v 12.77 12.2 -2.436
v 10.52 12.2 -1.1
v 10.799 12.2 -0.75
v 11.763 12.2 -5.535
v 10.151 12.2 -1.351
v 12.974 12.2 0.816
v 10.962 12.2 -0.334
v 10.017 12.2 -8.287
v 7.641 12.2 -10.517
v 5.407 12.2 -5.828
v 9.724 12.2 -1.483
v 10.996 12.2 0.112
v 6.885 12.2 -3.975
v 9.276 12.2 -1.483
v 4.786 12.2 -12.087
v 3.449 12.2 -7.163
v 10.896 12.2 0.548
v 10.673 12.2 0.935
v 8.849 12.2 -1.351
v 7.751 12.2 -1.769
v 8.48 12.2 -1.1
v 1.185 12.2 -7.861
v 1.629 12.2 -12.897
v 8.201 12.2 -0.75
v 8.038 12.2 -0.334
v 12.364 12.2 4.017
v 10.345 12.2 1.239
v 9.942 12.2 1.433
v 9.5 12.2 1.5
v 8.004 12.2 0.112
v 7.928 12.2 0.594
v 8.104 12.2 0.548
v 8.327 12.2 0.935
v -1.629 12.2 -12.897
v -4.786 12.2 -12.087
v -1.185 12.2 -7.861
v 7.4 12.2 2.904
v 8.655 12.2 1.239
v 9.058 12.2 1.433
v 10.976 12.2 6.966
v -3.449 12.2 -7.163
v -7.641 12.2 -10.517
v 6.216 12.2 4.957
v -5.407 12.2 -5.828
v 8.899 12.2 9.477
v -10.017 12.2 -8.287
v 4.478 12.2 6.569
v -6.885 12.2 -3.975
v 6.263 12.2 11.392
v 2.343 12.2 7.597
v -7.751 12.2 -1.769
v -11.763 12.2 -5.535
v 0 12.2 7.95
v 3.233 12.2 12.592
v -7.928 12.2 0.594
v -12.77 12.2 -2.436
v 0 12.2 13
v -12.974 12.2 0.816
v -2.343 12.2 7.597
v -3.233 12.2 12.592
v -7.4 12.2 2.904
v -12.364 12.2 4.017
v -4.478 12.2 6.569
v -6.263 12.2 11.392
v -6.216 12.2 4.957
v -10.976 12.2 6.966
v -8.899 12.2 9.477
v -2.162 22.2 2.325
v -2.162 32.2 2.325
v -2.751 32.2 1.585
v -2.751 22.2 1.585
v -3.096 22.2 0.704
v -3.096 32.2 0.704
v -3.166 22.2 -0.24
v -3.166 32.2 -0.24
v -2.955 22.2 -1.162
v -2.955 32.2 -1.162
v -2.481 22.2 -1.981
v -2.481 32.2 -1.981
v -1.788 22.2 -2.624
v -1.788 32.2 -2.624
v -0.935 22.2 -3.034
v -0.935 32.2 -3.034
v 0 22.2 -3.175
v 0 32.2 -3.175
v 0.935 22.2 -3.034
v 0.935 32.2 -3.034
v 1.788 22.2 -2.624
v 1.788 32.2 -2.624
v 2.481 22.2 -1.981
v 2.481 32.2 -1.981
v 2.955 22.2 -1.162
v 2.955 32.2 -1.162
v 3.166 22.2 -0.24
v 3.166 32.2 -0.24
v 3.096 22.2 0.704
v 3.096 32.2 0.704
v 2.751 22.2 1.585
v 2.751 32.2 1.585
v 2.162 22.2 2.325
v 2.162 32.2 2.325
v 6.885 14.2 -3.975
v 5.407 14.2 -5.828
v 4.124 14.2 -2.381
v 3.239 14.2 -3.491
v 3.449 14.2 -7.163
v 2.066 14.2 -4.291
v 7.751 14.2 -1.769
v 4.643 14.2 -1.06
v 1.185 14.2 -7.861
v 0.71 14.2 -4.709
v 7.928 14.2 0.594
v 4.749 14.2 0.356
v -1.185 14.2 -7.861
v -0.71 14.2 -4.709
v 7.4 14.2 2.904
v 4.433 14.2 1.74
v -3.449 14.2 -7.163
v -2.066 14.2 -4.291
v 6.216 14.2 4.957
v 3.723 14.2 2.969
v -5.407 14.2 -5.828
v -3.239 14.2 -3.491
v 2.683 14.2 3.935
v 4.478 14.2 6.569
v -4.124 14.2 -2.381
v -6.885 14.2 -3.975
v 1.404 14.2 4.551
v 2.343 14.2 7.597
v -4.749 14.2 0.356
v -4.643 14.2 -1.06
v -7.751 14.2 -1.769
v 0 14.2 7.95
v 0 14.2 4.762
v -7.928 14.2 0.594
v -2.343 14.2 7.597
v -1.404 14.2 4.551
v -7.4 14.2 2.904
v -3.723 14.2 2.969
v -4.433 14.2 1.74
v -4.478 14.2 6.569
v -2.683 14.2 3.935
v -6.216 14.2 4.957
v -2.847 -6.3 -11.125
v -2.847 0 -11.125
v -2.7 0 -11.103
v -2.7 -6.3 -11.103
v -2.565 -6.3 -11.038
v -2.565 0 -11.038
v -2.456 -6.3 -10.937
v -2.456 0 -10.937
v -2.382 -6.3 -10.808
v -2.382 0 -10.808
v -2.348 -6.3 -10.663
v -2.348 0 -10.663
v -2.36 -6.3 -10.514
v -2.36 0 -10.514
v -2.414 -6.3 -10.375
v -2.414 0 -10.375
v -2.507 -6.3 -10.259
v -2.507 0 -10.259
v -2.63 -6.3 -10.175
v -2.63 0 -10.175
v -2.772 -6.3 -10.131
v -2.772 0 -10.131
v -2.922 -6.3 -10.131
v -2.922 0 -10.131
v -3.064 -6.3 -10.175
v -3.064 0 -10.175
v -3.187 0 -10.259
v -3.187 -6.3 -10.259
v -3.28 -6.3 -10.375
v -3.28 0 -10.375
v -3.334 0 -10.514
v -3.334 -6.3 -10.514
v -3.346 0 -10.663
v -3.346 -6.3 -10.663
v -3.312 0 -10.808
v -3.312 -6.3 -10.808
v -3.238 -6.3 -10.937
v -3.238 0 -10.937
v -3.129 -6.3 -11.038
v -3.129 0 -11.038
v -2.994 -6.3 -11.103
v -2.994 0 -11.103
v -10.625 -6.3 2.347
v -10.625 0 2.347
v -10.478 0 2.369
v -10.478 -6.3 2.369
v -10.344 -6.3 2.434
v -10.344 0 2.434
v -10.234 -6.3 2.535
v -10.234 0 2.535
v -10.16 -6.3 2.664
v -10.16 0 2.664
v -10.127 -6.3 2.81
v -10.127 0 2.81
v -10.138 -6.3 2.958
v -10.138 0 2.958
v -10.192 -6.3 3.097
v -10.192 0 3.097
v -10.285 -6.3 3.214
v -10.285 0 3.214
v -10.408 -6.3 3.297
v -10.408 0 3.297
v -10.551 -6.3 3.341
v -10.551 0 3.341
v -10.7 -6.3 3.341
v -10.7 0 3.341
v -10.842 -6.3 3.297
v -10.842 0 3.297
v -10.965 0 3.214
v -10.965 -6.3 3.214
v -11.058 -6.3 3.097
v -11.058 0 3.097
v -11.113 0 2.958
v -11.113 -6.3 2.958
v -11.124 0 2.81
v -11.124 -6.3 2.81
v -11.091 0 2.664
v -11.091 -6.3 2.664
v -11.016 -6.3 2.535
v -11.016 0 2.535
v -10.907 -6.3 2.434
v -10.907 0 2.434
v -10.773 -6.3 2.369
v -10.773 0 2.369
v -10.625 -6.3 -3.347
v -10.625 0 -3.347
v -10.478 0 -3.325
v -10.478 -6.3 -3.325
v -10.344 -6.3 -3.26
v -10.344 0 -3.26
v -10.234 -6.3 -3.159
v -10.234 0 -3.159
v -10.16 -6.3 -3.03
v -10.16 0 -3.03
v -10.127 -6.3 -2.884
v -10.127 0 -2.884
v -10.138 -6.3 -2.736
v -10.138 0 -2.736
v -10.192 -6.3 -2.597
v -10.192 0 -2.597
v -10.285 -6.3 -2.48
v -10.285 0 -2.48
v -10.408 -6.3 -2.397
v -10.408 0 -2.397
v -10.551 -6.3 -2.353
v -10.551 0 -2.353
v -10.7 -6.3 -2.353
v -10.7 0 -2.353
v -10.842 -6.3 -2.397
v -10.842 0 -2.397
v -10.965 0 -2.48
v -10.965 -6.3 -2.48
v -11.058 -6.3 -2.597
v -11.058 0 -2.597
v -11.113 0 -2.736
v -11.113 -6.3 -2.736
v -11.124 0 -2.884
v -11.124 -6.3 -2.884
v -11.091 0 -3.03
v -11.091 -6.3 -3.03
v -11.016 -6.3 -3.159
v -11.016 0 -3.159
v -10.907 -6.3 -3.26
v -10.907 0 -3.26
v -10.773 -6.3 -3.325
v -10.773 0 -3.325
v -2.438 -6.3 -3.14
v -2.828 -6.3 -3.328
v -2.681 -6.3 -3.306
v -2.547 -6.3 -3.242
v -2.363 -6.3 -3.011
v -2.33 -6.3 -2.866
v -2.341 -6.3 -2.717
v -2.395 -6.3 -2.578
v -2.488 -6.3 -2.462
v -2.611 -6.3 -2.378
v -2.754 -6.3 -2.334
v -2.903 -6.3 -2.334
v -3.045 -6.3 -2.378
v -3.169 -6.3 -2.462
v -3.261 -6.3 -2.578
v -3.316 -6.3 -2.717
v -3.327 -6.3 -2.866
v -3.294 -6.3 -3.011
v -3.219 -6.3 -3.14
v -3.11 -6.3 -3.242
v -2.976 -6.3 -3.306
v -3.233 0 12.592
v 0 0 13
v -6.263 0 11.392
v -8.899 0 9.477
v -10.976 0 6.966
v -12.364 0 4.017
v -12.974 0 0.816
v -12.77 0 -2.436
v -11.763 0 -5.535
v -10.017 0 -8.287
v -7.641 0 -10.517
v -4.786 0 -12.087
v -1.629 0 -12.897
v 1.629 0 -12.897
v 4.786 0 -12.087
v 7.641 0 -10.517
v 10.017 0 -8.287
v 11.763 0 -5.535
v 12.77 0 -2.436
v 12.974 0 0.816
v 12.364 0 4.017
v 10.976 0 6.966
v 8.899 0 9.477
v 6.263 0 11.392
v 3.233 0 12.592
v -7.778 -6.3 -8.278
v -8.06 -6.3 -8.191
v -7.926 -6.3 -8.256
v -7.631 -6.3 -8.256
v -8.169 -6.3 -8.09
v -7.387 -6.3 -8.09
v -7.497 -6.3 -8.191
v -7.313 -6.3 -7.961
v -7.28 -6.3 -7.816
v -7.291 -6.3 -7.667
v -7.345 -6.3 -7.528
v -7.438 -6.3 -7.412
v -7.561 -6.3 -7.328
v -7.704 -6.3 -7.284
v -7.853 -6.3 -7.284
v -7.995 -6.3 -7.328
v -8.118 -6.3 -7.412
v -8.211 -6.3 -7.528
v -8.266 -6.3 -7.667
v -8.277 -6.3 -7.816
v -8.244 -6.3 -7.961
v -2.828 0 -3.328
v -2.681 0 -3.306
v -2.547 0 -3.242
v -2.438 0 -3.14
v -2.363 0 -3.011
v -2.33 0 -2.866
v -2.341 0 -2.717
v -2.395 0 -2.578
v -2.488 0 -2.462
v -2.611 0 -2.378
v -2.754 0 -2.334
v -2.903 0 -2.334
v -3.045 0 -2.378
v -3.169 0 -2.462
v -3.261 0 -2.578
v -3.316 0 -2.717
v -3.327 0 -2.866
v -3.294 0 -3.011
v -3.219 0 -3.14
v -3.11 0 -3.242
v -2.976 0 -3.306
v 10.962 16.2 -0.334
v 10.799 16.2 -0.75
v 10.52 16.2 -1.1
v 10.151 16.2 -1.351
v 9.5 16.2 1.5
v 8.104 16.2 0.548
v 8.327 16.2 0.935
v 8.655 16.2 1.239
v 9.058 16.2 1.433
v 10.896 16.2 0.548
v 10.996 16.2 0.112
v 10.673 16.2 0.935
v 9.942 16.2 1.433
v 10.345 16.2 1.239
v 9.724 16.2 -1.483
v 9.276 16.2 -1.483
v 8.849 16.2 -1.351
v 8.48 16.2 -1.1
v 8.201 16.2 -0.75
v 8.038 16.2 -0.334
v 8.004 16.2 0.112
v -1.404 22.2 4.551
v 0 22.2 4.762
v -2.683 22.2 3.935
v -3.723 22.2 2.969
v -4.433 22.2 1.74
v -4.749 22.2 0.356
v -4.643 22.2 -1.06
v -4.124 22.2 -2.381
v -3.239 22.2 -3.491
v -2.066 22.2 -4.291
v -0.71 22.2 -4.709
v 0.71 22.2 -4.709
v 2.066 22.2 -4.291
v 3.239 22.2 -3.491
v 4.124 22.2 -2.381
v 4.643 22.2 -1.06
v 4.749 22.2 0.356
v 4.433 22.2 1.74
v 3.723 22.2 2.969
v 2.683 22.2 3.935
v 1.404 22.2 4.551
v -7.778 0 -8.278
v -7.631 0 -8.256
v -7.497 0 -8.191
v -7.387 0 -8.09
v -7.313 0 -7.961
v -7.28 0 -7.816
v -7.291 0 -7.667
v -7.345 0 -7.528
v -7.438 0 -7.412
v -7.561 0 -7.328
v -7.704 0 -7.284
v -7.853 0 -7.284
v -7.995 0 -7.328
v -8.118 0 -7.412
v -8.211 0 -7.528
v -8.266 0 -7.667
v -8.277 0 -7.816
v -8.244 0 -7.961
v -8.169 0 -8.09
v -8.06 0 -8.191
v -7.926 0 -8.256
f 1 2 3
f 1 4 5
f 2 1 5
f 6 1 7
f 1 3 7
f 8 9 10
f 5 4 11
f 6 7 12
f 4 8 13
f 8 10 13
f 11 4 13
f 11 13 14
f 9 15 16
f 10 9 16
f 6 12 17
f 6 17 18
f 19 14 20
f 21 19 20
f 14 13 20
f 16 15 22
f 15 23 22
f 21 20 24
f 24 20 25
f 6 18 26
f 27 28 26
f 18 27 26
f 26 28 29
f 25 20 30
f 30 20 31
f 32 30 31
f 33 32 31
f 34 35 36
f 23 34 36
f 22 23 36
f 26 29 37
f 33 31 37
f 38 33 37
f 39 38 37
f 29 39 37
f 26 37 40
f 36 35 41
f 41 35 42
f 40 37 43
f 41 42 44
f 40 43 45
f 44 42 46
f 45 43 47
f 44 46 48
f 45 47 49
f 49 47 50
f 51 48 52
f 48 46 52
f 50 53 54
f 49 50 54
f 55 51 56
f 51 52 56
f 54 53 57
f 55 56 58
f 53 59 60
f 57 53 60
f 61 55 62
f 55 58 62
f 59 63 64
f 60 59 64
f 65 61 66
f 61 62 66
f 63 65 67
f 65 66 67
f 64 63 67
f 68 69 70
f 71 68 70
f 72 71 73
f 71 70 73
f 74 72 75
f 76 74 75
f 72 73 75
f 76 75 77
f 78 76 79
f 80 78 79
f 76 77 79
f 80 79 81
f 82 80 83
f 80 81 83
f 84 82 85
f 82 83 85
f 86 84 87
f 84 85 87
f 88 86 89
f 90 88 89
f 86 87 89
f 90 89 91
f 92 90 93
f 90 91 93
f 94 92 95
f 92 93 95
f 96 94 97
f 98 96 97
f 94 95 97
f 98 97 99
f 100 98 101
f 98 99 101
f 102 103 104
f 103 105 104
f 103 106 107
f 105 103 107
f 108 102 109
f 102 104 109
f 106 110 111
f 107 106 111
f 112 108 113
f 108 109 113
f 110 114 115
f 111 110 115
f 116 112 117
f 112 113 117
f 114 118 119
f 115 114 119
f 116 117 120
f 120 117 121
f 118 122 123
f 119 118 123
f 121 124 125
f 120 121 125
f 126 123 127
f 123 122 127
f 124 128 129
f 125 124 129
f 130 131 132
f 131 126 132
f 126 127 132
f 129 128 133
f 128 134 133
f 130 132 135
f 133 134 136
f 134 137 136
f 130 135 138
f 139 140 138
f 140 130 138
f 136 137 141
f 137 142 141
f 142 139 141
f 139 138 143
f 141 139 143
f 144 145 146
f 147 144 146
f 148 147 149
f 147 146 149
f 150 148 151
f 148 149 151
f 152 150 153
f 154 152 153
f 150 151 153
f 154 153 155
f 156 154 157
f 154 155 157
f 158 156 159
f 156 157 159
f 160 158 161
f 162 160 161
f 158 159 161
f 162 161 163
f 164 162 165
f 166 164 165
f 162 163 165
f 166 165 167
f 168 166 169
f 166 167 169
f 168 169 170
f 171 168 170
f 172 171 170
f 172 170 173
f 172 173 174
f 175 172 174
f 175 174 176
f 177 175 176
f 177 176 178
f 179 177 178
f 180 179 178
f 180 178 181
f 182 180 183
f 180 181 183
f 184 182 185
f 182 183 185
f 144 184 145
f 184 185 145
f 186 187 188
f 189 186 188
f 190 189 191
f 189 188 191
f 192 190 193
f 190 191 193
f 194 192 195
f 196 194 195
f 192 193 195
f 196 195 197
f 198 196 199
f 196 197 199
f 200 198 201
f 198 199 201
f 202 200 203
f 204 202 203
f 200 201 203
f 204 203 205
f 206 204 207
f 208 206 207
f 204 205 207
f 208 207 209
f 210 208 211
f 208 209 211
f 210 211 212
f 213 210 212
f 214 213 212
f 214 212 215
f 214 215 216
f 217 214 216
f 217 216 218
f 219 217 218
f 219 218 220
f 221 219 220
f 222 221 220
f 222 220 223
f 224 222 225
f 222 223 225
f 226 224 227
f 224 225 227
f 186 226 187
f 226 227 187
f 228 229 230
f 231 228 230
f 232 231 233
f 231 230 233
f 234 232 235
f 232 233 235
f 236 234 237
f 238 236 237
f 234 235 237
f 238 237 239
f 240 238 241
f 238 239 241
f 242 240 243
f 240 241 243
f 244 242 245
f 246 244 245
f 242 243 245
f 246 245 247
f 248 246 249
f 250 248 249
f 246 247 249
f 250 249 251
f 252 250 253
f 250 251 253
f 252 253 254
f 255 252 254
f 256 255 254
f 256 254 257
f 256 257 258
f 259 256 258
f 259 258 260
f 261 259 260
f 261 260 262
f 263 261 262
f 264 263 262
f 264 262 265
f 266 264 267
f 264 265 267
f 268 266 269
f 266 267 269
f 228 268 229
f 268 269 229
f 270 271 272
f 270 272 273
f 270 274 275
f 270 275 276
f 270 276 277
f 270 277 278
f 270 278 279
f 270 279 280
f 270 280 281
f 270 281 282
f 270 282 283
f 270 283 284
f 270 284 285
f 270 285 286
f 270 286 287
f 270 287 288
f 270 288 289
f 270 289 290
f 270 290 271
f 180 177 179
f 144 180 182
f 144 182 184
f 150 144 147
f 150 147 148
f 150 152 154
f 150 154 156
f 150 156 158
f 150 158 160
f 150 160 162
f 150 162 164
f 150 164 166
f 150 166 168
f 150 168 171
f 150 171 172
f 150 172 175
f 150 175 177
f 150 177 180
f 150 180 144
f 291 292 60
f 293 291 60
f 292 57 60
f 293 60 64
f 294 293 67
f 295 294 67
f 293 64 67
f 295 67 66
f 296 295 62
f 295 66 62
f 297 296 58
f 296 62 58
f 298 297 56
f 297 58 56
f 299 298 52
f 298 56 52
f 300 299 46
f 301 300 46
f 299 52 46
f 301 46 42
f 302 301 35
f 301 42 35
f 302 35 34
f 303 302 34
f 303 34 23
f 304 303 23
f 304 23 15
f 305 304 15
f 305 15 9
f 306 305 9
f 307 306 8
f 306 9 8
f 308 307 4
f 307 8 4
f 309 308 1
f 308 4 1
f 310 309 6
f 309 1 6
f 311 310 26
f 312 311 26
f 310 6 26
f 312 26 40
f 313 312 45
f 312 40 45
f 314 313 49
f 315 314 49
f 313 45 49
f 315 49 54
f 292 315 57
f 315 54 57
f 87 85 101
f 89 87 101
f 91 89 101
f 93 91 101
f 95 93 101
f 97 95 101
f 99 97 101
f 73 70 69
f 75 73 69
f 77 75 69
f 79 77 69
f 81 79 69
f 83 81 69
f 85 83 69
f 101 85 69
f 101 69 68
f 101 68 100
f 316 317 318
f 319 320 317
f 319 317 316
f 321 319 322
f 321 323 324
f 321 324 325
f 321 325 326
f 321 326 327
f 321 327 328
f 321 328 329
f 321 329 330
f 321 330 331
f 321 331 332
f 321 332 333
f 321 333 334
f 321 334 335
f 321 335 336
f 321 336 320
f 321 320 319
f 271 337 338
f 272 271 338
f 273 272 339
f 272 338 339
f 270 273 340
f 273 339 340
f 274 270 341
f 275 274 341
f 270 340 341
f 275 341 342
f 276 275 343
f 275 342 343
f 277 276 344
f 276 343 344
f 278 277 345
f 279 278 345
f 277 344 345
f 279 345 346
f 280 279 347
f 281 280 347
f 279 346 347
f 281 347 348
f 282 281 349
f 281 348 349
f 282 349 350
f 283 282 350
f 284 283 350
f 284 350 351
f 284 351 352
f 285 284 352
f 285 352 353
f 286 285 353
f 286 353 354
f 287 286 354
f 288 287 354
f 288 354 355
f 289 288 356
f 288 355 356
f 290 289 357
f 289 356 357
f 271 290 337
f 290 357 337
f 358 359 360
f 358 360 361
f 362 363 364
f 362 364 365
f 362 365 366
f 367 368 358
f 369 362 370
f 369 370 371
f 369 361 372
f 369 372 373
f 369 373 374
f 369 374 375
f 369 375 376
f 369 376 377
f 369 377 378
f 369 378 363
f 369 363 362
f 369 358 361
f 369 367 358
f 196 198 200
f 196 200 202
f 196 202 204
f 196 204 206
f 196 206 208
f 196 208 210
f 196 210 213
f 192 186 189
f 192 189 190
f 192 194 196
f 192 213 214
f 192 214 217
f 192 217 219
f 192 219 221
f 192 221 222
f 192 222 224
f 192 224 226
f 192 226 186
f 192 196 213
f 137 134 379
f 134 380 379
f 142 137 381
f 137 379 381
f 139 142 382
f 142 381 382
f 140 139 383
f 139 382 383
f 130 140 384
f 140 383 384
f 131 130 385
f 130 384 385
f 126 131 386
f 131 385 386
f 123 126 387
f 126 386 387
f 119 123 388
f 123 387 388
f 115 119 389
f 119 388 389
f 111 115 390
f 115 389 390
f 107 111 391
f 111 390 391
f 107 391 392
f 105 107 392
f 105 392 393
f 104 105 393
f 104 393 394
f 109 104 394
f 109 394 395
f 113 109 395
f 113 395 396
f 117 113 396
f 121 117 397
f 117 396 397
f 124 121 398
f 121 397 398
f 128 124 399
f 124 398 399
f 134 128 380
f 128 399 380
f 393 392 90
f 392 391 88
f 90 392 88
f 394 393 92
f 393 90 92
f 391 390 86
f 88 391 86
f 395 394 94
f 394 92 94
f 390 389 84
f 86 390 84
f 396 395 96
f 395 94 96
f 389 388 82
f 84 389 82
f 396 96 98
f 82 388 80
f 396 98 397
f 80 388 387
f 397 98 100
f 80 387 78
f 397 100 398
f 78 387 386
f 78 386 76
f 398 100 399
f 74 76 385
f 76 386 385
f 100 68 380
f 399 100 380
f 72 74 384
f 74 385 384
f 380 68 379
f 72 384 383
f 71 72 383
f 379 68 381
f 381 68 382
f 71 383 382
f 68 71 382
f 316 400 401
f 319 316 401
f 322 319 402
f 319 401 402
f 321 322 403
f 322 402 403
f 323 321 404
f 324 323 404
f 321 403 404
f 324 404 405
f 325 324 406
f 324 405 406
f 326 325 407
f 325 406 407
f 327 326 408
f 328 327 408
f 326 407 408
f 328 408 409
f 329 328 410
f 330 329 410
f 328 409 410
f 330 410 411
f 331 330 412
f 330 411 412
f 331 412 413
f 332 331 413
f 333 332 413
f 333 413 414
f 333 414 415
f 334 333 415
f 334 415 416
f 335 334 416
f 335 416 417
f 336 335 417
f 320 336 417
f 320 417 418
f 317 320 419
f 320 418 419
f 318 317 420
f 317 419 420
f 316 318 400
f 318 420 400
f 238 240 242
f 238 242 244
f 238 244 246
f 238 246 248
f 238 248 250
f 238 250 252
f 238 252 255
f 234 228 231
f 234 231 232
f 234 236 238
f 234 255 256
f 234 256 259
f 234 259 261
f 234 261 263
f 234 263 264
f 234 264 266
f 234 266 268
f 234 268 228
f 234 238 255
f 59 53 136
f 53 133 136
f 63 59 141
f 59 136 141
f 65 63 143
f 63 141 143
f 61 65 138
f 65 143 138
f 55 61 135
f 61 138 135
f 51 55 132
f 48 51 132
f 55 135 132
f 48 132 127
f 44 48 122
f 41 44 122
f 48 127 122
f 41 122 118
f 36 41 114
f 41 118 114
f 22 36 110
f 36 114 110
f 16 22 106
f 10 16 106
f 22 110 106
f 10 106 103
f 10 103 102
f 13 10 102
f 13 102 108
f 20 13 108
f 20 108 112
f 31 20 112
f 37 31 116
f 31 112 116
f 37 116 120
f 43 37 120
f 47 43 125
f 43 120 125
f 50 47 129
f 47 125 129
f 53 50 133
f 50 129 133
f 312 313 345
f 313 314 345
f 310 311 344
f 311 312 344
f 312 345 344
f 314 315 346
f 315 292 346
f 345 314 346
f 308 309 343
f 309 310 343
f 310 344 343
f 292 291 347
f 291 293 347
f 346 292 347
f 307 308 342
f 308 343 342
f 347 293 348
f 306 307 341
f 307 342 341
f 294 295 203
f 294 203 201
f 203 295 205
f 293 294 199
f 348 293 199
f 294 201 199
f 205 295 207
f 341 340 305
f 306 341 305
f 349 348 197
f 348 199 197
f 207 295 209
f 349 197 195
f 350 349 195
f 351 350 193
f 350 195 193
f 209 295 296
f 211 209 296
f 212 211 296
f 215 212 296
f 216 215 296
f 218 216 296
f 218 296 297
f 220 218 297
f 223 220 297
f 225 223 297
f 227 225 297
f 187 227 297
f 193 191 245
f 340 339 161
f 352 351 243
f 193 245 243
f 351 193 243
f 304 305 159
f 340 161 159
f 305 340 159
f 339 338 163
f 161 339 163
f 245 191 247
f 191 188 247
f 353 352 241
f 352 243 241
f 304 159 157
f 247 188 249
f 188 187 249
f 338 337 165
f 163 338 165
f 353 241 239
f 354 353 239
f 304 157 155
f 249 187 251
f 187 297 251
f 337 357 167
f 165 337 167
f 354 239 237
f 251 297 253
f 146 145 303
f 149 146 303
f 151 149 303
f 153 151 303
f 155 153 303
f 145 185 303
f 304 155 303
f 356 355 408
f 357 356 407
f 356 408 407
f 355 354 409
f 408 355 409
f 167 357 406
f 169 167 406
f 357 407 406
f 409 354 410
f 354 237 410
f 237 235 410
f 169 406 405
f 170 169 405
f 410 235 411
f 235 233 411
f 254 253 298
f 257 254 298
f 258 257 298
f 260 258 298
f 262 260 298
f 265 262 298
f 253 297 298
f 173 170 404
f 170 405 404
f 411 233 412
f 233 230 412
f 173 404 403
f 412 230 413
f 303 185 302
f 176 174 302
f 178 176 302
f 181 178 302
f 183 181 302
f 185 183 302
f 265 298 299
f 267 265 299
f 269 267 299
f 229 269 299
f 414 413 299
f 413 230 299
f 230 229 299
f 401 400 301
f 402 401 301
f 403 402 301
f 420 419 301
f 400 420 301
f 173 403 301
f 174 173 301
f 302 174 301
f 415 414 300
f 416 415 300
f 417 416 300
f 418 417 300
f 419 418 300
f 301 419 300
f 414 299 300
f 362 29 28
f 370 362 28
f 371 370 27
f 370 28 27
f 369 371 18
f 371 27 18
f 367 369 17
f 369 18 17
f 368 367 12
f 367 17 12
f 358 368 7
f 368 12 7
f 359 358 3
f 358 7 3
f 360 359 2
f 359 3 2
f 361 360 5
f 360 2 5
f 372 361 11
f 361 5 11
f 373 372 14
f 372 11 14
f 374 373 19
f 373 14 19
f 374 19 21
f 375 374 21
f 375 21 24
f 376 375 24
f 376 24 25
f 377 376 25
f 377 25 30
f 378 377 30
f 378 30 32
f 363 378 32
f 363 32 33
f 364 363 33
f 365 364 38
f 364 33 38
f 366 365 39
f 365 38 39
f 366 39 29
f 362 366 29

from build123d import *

# Parameters (mm, degrees)
CUT_EXTRUDE1_DEPTH  = 10
SKETCH6_R           = 1.5
BOSS_EXTRUDE3_DEPTH = 4
SKETCH7_R           = 0.5
BOSS_EXTRUDE4_DEPTH = 6.3


with BuildPart() as part:
    # Sketch1 → Revolve1 (revolve)
    with BuildSketch(Plane(origin=(0, 0, 0), x_dir=(0, 0, -1), z_dir=(1, 0, 0))):
        Polygon((0, 0), (-13, 0), (-13, 12.2), (-7.95, 12.2), (-7.95, 14.2), (-4.7625, 14.2), (-4.7625, 22.2), (-3.175, 22.2), (-3.175, 32.2), (0, 32.2), align=None)
    revolve(axis=Axis((0, 0, 0), (0, -1, 0)))

    # Sketch3 → Cut-Extrude1 (cut)
    with BuildSketch(Plane(origin=(0, 32.2, 0), x_dir=(1, 0, 0), z_dir=(0, 1, 0))):
        with BuildLine():
            Line((-2.162174831, -2.325), (2.162174831, -2.325))
            ThreePointArc((2.162174831, -2.325), (0, -3.175), (-2.162174831, -2.325))
        make_face()
    extrude(amount=-CUT_EXTRUDE1_DEPTH, mode=Mode.SUBTRACT)

    # Sketch6 → Boss-Extrude3 (add)
    with BuildSketch(Plane(origin=(0, 12.2, 0), x_dir=(1, 0, 0), z_dir=(0, 1, 0))):
        with Locations(Location((9.5, 0, 0), (0, 0, 270))):
            Circle(SKETCH6_R)
    extrude(amount=BOSS_EXTRUDE3_DEPTH)

    # Sketch7 → Boss-Extrude4 (add)
    with BuildSketch(Plane.XZ):
        with Locations(Location((-2.847009496, -10.625184089, 0), (0, 0, 270))):
            Circle(SKETCH7_R)
        with Locations(Location((-7.778174593, -7.778174593, 0), (0, 0, 270))):
            Circle(SKETCH7_R)
        with Locations(Location((-2.828427125, -2.828427125, 0), (0, 0, 270))):
            Circle(SKETCH7_R)
        with Locations(Location((-10.625184089, -2.847009496, 0), (0, 0, 270))):
            Circle(SKETCH7_R)
        with Locations(Location((-10.625184089, 2.847009496, 0), (0, 0, 270))):
            Circle(SKETCH7_R)
    extrude(amount=BOSS_EXTRUDE4_DEPTH)


solid = part.part
